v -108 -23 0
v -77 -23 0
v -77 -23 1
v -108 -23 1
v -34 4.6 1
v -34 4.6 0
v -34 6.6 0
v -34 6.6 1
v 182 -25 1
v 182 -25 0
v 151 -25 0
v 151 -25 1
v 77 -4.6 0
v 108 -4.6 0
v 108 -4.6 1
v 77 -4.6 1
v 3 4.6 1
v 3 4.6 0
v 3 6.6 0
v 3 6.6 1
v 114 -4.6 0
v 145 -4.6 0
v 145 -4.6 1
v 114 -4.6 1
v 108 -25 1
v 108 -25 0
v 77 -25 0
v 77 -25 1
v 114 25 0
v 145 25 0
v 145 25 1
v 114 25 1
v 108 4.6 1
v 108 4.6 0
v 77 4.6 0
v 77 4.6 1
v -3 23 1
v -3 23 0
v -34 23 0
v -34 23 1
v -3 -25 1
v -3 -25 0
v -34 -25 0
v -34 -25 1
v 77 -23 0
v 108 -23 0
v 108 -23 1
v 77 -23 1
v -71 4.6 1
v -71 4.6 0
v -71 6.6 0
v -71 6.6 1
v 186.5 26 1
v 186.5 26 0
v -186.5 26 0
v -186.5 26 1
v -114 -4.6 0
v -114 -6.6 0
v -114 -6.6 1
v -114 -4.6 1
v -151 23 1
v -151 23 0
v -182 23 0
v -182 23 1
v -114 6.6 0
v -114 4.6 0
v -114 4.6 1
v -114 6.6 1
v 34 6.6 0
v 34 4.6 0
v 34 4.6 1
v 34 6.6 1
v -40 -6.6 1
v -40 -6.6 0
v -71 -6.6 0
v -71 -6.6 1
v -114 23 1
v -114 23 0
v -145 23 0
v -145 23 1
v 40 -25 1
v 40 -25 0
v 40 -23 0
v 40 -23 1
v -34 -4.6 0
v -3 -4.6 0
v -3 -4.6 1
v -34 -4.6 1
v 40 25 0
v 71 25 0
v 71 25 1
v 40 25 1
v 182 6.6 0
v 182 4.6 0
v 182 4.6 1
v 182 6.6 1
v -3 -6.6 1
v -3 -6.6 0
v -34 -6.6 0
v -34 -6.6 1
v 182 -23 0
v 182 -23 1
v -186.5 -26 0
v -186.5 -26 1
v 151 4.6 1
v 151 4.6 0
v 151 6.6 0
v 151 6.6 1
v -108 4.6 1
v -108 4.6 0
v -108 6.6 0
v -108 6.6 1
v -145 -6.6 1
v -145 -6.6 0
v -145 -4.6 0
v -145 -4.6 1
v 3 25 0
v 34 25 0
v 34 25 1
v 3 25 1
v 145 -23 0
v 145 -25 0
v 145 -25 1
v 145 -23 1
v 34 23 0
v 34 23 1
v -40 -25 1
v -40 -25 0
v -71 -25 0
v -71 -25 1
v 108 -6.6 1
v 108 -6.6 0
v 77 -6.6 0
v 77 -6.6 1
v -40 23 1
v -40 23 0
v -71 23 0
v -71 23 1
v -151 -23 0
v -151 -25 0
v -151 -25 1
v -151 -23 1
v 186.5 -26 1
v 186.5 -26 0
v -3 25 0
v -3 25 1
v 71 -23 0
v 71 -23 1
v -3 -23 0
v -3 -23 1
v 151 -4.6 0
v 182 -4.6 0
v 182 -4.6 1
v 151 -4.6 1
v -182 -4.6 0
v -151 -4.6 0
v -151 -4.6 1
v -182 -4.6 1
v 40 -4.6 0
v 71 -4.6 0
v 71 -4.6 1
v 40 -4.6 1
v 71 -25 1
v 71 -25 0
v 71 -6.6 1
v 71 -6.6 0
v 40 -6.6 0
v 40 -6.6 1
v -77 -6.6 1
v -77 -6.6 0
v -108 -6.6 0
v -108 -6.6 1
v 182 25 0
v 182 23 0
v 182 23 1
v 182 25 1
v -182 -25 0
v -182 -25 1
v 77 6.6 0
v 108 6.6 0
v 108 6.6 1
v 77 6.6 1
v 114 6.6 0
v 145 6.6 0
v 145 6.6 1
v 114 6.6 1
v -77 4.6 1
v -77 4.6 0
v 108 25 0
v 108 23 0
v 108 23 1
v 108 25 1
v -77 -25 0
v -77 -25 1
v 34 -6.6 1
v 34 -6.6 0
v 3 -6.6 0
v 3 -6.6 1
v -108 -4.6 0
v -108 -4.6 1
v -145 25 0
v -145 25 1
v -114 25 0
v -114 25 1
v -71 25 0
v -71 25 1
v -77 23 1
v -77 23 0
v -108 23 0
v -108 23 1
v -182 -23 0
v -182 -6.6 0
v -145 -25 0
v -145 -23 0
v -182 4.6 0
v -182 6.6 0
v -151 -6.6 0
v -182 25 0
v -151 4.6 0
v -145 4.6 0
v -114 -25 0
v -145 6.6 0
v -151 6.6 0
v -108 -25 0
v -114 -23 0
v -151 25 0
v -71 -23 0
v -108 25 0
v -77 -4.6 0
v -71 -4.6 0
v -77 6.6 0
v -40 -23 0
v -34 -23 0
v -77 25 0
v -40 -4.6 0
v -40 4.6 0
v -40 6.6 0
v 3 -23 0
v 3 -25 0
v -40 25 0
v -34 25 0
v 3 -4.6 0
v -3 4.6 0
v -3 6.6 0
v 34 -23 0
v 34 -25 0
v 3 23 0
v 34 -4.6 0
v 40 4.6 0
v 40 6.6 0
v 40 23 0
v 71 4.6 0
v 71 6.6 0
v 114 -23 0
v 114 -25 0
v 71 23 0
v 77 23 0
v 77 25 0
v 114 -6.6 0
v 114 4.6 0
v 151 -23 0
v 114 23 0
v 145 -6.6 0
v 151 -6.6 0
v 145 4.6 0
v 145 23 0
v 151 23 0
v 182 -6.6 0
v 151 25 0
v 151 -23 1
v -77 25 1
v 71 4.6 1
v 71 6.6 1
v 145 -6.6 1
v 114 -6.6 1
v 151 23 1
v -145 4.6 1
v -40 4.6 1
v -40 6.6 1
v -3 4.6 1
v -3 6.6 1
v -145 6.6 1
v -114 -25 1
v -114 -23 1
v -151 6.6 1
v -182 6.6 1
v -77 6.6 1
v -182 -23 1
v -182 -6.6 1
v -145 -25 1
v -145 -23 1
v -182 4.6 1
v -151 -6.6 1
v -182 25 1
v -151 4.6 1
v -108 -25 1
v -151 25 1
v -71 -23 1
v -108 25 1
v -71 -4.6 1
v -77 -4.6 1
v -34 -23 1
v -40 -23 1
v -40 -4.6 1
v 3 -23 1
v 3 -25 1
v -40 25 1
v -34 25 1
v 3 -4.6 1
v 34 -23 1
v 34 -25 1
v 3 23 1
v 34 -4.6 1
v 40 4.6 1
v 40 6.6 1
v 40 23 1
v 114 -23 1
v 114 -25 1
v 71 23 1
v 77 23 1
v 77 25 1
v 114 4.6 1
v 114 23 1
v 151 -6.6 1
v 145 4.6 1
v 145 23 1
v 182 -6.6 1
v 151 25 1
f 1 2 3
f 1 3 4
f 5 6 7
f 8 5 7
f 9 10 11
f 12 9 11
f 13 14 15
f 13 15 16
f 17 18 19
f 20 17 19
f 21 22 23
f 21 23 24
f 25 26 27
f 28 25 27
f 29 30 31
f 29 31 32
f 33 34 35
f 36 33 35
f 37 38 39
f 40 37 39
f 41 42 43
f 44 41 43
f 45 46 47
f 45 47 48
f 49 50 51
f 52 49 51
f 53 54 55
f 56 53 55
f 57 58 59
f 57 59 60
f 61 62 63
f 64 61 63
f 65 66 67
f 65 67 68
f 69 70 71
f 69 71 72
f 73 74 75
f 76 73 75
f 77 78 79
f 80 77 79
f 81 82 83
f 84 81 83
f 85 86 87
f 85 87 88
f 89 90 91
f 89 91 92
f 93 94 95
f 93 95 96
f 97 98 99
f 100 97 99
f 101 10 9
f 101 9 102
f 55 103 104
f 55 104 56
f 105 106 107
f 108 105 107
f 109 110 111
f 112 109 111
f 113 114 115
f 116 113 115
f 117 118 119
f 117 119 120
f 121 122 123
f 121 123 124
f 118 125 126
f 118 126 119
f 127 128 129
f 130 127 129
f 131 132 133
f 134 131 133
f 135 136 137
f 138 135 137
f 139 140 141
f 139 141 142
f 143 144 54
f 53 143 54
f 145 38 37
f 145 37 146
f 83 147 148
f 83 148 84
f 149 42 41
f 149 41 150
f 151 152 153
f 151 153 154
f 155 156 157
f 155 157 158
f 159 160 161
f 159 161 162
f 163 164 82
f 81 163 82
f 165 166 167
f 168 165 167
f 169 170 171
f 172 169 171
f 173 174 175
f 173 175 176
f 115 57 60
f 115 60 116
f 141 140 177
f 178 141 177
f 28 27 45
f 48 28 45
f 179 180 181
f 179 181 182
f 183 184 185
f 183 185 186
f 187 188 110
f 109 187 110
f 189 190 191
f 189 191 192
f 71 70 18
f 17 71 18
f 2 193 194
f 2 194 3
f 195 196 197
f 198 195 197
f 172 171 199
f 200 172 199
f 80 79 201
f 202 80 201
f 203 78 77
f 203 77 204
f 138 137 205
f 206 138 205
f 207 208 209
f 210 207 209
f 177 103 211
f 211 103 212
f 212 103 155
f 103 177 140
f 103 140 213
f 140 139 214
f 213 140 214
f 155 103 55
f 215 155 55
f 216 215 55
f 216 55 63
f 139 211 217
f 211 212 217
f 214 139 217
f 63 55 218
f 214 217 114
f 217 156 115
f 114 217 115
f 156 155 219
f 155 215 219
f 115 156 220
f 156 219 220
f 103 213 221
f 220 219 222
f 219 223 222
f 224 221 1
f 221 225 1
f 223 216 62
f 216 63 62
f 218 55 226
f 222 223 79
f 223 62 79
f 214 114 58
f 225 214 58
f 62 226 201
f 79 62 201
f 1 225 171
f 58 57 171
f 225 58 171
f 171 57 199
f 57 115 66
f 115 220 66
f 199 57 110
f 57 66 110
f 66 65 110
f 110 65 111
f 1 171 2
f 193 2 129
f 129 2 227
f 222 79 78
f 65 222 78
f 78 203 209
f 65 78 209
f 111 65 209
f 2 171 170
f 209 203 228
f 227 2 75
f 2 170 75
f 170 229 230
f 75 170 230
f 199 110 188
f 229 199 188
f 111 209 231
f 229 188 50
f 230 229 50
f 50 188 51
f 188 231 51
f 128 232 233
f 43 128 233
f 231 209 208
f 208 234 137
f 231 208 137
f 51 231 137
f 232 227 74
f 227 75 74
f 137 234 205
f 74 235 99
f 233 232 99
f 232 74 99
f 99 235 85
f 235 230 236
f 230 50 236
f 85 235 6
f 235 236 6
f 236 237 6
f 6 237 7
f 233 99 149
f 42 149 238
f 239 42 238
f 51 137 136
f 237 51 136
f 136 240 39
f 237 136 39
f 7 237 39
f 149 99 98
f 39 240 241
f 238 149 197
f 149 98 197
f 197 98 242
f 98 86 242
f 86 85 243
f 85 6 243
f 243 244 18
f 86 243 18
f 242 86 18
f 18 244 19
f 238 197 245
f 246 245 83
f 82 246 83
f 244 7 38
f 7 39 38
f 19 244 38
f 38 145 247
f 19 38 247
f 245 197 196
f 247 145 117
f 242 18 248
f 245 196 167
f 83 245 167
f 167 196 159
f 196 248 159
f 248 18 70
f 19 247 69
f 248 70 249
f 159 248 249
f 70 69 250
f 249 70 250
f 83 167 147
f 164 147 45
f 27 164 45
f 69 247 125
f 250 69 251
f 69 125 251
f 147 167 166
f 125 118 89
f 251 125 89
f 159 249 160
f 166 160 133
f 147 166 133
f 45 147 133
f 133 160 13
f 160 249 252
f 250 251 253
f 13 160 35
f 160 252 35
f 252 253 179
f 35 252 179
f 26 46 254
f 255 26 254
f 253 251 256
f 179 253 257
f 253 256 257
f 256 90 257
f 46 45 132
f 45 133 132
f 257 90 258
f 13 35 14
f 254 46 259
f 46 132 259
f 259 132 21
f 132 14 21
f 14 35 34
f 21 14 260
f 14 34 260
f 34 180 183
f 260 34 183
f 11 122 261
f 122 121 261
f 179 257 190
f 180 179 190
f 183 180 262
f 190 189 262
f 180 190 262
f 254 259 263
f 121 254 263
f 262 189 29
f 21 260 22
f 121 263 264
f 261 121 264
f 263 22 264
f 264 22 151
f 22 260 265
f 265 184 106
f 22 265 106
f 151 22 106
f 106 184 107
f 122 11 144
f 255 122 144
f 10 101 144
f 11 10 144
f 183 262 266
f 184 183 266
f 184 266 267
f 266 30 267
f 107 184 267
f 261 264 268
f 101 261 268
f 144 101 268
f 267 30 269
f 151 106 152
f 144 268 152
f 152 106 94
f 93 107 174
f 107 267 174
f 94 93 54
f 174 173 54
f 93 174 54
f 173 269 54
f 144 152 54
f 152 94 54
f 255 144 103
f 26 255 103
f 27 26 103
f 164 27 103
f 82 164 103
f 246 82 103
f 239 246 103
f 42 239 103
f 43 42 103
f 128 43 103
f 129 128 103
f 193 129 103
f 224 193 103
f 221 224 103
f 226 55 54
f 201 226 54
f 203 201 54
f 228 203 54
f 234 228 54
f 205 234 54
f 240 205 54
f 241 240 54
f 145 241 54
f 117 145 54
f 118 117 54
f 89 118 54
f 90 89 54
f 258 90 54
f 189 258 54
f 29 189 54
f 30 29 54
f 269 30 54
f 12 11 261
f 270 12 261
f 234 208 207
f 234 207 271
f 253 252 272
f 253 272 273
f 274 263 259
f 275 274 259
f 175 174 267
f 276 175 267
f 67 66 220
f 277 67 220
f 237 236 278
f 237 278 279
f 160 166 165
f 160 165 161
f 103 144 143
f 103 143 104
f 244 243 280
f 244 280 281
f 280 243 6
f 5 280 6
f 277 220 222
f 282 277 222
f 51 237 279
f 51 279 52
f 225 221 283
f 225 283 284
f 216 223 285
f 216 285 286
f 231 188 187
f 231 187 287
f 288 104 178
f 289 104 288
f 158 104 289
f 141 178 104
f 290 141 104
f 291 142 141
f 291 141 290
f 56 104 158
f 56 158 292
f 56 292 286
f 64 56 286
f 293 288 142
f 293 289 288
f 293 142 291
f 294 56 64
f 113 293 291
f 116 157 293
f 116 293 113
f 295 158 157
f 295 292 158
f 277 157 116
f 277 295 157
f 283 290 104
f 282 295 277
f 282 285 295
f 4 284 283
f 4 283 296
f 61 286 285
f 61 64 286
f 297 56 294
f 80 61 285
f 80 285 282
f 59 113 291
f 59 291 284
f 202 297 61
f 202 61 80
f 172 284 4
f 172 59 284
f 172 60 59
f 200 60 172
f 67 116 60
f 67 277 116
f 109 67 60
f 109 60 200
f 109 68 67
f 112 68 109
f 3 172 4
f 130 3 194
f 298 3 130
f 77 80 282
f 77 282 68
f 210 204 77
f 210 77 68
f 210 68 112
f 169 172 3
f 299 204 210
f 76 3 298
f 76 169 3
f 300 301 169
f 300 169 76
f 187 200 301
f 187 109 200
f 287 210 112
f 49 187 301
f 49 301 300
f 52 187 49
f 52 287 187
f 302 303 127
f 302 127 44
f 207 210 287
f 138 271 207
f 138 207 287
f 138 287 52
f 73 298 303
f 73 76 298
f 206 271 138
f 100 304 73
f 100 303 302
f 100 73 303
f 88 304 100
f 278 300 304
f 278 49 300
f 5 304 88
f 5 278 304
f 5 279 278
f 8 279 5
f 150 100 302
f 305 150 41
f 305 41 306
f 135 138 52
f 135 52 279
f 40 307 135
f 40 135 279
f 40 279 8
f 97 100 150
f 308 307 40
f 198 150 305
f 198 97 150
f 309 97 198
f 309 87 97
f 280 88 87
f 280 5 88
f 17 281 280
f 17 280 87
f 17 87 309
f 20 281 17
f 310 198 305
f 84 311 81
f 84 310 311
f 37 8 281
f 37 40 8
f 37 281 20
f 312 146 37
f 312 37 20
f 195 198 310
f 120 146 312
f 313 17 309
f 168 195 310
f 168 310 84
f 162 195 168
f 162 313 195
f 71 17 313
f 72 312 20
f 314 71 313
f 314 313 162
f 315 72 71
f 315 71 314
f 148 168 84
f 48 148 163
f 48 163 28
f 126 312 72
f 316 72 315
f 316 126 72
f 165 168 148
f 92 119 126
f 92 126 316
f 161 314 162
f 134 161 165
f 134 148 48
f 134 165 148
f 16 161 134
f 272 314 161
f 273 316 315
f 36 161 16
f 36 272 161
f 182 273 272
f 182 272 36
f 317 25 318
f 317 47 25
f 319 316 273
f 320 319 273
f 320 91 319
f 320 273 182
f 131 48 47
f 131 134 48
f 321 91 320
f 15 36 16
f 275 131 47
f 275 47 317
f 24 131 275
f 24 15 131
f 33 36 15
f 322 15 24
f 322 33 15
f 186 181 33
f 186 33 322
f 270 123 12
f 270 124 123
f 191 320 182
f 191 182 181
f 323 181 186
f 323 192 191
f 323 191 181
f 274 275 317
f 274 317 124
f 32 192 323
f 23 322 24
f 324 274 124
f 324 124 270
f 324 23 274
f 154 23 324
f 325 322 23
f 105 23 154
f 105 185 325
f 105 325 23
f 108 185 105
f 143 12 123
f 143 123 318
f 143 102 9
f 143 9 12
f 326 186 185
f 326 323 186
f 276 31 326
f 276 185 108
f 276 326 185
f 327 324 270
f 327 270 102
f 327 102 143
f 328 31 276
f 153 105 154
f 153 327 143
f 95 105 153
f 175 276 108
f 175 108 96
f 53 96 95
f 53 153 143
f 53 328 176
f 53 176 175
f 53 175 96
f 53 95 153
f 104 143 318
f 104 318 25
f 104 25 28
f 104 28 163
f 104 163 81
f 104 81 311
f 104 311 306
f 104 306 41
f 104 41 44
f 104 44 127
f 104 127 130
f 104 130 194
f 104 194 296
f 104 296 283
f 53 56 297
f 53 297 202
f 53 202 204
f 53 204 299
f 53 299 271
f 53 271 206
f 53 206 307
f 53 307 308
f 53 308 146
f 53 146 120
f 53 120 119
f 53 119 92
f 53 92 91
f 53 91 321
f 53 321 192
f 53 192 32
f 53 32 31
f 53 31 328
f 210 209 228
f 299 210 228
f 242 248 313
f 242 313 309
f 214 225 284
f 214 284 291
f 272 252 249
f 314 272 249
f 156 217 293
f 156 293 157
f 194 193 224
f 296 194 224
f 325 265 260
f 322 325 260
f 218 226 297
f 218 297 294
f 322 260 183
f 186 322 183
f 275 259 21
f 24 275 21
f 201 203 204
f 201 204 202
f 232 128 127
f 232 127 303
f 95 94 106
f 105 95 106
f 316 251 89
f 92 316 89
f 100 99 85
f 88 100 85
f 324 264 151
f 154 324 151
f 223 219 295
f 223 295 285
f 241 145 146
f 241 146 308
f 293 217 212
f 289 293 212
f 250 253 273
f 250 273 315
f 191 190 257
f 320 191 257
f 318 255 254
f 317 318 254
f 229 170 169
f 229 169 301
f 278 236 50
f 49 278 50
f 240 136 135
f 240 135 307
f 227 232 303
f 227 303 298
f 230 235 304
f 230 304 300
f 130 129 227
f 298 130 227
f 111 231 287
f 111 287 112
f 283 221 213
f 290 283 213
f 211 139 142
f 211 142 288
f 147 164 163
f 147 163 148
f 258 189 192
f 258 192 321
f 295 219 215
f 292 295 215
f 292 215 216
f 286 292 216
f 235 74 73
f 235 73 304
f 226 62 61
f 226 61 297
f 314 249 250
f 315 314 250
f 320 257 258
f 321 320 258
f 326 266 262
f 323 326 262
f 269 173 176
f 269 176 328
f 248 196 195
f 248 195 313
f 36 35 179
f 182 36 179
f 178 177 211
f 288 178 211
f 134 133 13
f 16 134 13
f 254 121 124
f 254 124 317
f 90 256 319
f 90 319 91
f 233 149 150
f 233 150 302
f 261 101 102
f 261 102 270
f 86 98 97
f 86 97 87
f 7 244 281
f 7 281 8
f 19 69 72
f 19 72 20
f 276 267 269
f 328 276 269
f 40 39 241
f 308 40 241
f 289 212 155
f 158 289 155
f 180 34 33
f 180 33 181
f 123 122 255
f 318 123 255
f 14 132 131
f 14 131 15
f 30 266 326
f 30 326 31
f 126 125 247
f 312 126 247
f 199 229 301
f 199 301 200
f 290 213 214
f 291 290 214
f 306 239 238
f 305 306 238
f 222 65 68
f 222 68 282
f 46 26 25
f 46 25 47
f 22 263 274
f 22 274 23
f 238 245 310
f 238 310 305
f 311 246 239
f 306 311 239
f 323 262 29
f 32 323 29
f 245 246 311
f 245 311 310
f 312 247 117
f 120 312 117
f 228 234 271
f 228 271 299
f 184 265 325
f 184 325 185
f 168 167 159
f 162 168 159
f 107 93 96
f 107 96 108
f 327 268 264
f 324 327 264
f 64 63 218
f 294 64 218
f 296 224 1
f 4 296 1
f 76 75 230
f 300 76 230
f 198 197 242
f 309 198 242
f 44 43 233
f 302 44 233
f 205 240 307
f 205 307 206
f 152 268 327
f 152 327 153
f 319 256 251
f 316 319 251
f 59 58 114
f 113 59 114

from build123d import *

# Parameters (mm, degrees)
SZKIC1_W                    = 374
SZKIC1_H                    = 53
DODANIE_WYCI_GNI_CIE1_DEPTH = 1
SZKIC6_W                    = 31
SZKIC6_H                    = 2
WYTNIJ_WYCI_GNI_CIE1_DEPTH  = 2
SZKIC7_W                    = 374
SZKIC7_H                    = 53
SZKIC7_W_2                  = 373
SZKIC7_H_2                  = 52
WYTNIJ_WYCI_GNI_CIE2_DEPTH  = 10


with BuildPart() as part:
    # Szkic1 → Dodanie-wyciągnięcie1 (new body)
    with BuildSketch(Plane.XY):
        Rectangle(SZKIC1_W, SZKIC1_H)
    extrude(amount=DODANIE_WYCI_GNI_CIE1_DEPTH)

    # Szkic6 → Wytnij-wyciągnięcie1 (cut)
    with BuildSketch(Plane(origin=(0, 0, 0), x_dir=(-1, 0, 0), z_dir=(0, 0, -1))):
        with Locations((-166.5, -5.6)):
            Rectangle(SZKIC6_W, SZKIC6_H)
        with Locations((-129.5, -5.6)):
            Rectangle(SZKIC6_W, SZKIC6_H)
        with Locations((-92.5, -5.6)):
            Rectangle(SZKIC6_W, SZKIC6_H)
        with Locations((-18.5, -5.6)):
            Rectangle(SZKIC6_W, SZKIC6_H)
        with Locations((18.5, -5.6)):
            Rectangle(SZKIC6_W, SZKIC6_H)
        with Locations((55.5, -5.6)):
            Rectangle(SZKIC6_W, SZKIC6_H)
        with Locations((92.5, -5.6)):
            Rectangle(SZKIC6_W, SZKIC6_H)
        with Locations((129.5, -5.6)):
            Rectangle(SZKIC6_W, SZKIC6_H)
        with Locations((166.5, -5.6)):
            Rectangle(SZKIC6_W, SZKIC6_H)
        with Locations((-129.5, -24)):
            Rectangle(SZKIC6_W, SZKIC6_H)
        with Locations((-166.5, 24)):
            Rectangle(SZKIC6_W, SZKIC6_H)
        with Locations((-166.5, -24)):
            Rectangle(SZKIC6_W, SZKIC6_H)
        with Locations((-129.5, 24)):
            Rectangle(SZKIC6_W, SZKIC6_H)
        with Locations((-92.5, -24)):
            Rectangle(SZKIC6_W, SZKIC6_H)
        with Locations((-92.5, 24)):
            Rectangle(SZKIC6_W, SZKIC6_H)
        with Locations((-55.5, -24)):
            Rectangle(SZKIC6_W, SZKIC6_H)
        with Locations((-55.5, 24)):
            Rectangle(SZKIC6_W, SZKIC6_H)
        with Locations((-18.5, -24)):
            Rectangle(SZKIC6_W, SZKIC6_H)
        with Locations((-18.5, 24)):
            Rectangle(SZKIC6_W, SZKIC6_H)
        with Locations((18.5, -24)):
            Rectangle(SZKIC6_W, SZKIC6_H)
        with Locations((18.5, 24)):
            Rectangle(SZKIC6_W, SZKIC6_H)
        with Locations((55.5, -24)):
            Rectangle(SZKIC6_W, SZKIC6_H)
        with Locations((55.5, 24)):
            Rectangle(SZKIC6_W, SZKIC6_H)
        with Locations((92.5, -24)):
            Rectangle(SZKIC6_W, SZKIC6_H)
        with Locations((92.5, 24)):
            Rectangle(SZKIC6_W, SZKIC6_H)
        with Locations((129.5, -24)):
            Rectangle(SZKIC6_W, SZKIC6_H)
        with Locations((129.5, 24)):
            Rectangle(SZKIC6_W, SZKIC6_H)
        with Locations((166.5, -24)):
            Rectangle(SZKIC6_W, SZKIC6_H)
        with Locations((166.5, 24)):
            Rectangle(SZKIC6_W, SZKIC6_H)
        with Locations((-129.5, 5.6)):
            Rectangle(SZKIC6_W, SZKIC6_H)
        with Locations((-55.5, -5.6)):
            Rectangle(SZKIC6_W, SZKIC6_H)
        with Locations((-166.5, 5.6)):
            Rectangle(SZKIC6_W, SZKIC6_H)
        with Locations((-92.5, 5.6)):
            Rectangle(SZKIC6_W, SZKIC6_H)
        with Locations((-55.5, 5.6)):
            Rectangle(SZKIC6_W, SZKIC6_H)
        with Locations((-18.5, 5.6)):
            Rectangle(SZKIC6_W, SZKIC6_H)
        with Locations((18.5, 5.6)):
            Rectangle(SZKIC6_W, SZKIC6_H)
        with Locations((55.5, 5.6)):
            Rectangle(SZKIC6_W, SZKIC6_H)
        with Locations((92.5, 5.6)):
            Rectangle(SZKIC6_W, SZKIC6_H)
        with Locations((129.5, 5.6)):
            Rectangle(SZKIC6_W, SZKIC6_H)
        with Locations((166.5, 5.6)):
            Rectangle(SZKIC6_W, SZKIC6_H)
    extrude(amount=-WYTNIJ_WYCI_GNI_CIE1_DEPTH, mode=Mode.SUBTRACT)

    # Szkic7 → Wytnij-wyciągnięcie2 (cut)
    with BuildSketch(Plane(origin=(0, 0, 0), x_dir=(-1, 0, 0), z_dir=(0, 0, -1))):
        Rectangle(SZKIC7_W, SZKIC7_H)
        Rectangle(SZKIC7_W_2, SZKIC7_H_2, mode=Mode.SUBTRACT)
    extrude(amount=-WYTNIJ_WYCI_GNI_CIE2_DEPTH, mode=Mode.SUBTRACT)


solid = part.part
